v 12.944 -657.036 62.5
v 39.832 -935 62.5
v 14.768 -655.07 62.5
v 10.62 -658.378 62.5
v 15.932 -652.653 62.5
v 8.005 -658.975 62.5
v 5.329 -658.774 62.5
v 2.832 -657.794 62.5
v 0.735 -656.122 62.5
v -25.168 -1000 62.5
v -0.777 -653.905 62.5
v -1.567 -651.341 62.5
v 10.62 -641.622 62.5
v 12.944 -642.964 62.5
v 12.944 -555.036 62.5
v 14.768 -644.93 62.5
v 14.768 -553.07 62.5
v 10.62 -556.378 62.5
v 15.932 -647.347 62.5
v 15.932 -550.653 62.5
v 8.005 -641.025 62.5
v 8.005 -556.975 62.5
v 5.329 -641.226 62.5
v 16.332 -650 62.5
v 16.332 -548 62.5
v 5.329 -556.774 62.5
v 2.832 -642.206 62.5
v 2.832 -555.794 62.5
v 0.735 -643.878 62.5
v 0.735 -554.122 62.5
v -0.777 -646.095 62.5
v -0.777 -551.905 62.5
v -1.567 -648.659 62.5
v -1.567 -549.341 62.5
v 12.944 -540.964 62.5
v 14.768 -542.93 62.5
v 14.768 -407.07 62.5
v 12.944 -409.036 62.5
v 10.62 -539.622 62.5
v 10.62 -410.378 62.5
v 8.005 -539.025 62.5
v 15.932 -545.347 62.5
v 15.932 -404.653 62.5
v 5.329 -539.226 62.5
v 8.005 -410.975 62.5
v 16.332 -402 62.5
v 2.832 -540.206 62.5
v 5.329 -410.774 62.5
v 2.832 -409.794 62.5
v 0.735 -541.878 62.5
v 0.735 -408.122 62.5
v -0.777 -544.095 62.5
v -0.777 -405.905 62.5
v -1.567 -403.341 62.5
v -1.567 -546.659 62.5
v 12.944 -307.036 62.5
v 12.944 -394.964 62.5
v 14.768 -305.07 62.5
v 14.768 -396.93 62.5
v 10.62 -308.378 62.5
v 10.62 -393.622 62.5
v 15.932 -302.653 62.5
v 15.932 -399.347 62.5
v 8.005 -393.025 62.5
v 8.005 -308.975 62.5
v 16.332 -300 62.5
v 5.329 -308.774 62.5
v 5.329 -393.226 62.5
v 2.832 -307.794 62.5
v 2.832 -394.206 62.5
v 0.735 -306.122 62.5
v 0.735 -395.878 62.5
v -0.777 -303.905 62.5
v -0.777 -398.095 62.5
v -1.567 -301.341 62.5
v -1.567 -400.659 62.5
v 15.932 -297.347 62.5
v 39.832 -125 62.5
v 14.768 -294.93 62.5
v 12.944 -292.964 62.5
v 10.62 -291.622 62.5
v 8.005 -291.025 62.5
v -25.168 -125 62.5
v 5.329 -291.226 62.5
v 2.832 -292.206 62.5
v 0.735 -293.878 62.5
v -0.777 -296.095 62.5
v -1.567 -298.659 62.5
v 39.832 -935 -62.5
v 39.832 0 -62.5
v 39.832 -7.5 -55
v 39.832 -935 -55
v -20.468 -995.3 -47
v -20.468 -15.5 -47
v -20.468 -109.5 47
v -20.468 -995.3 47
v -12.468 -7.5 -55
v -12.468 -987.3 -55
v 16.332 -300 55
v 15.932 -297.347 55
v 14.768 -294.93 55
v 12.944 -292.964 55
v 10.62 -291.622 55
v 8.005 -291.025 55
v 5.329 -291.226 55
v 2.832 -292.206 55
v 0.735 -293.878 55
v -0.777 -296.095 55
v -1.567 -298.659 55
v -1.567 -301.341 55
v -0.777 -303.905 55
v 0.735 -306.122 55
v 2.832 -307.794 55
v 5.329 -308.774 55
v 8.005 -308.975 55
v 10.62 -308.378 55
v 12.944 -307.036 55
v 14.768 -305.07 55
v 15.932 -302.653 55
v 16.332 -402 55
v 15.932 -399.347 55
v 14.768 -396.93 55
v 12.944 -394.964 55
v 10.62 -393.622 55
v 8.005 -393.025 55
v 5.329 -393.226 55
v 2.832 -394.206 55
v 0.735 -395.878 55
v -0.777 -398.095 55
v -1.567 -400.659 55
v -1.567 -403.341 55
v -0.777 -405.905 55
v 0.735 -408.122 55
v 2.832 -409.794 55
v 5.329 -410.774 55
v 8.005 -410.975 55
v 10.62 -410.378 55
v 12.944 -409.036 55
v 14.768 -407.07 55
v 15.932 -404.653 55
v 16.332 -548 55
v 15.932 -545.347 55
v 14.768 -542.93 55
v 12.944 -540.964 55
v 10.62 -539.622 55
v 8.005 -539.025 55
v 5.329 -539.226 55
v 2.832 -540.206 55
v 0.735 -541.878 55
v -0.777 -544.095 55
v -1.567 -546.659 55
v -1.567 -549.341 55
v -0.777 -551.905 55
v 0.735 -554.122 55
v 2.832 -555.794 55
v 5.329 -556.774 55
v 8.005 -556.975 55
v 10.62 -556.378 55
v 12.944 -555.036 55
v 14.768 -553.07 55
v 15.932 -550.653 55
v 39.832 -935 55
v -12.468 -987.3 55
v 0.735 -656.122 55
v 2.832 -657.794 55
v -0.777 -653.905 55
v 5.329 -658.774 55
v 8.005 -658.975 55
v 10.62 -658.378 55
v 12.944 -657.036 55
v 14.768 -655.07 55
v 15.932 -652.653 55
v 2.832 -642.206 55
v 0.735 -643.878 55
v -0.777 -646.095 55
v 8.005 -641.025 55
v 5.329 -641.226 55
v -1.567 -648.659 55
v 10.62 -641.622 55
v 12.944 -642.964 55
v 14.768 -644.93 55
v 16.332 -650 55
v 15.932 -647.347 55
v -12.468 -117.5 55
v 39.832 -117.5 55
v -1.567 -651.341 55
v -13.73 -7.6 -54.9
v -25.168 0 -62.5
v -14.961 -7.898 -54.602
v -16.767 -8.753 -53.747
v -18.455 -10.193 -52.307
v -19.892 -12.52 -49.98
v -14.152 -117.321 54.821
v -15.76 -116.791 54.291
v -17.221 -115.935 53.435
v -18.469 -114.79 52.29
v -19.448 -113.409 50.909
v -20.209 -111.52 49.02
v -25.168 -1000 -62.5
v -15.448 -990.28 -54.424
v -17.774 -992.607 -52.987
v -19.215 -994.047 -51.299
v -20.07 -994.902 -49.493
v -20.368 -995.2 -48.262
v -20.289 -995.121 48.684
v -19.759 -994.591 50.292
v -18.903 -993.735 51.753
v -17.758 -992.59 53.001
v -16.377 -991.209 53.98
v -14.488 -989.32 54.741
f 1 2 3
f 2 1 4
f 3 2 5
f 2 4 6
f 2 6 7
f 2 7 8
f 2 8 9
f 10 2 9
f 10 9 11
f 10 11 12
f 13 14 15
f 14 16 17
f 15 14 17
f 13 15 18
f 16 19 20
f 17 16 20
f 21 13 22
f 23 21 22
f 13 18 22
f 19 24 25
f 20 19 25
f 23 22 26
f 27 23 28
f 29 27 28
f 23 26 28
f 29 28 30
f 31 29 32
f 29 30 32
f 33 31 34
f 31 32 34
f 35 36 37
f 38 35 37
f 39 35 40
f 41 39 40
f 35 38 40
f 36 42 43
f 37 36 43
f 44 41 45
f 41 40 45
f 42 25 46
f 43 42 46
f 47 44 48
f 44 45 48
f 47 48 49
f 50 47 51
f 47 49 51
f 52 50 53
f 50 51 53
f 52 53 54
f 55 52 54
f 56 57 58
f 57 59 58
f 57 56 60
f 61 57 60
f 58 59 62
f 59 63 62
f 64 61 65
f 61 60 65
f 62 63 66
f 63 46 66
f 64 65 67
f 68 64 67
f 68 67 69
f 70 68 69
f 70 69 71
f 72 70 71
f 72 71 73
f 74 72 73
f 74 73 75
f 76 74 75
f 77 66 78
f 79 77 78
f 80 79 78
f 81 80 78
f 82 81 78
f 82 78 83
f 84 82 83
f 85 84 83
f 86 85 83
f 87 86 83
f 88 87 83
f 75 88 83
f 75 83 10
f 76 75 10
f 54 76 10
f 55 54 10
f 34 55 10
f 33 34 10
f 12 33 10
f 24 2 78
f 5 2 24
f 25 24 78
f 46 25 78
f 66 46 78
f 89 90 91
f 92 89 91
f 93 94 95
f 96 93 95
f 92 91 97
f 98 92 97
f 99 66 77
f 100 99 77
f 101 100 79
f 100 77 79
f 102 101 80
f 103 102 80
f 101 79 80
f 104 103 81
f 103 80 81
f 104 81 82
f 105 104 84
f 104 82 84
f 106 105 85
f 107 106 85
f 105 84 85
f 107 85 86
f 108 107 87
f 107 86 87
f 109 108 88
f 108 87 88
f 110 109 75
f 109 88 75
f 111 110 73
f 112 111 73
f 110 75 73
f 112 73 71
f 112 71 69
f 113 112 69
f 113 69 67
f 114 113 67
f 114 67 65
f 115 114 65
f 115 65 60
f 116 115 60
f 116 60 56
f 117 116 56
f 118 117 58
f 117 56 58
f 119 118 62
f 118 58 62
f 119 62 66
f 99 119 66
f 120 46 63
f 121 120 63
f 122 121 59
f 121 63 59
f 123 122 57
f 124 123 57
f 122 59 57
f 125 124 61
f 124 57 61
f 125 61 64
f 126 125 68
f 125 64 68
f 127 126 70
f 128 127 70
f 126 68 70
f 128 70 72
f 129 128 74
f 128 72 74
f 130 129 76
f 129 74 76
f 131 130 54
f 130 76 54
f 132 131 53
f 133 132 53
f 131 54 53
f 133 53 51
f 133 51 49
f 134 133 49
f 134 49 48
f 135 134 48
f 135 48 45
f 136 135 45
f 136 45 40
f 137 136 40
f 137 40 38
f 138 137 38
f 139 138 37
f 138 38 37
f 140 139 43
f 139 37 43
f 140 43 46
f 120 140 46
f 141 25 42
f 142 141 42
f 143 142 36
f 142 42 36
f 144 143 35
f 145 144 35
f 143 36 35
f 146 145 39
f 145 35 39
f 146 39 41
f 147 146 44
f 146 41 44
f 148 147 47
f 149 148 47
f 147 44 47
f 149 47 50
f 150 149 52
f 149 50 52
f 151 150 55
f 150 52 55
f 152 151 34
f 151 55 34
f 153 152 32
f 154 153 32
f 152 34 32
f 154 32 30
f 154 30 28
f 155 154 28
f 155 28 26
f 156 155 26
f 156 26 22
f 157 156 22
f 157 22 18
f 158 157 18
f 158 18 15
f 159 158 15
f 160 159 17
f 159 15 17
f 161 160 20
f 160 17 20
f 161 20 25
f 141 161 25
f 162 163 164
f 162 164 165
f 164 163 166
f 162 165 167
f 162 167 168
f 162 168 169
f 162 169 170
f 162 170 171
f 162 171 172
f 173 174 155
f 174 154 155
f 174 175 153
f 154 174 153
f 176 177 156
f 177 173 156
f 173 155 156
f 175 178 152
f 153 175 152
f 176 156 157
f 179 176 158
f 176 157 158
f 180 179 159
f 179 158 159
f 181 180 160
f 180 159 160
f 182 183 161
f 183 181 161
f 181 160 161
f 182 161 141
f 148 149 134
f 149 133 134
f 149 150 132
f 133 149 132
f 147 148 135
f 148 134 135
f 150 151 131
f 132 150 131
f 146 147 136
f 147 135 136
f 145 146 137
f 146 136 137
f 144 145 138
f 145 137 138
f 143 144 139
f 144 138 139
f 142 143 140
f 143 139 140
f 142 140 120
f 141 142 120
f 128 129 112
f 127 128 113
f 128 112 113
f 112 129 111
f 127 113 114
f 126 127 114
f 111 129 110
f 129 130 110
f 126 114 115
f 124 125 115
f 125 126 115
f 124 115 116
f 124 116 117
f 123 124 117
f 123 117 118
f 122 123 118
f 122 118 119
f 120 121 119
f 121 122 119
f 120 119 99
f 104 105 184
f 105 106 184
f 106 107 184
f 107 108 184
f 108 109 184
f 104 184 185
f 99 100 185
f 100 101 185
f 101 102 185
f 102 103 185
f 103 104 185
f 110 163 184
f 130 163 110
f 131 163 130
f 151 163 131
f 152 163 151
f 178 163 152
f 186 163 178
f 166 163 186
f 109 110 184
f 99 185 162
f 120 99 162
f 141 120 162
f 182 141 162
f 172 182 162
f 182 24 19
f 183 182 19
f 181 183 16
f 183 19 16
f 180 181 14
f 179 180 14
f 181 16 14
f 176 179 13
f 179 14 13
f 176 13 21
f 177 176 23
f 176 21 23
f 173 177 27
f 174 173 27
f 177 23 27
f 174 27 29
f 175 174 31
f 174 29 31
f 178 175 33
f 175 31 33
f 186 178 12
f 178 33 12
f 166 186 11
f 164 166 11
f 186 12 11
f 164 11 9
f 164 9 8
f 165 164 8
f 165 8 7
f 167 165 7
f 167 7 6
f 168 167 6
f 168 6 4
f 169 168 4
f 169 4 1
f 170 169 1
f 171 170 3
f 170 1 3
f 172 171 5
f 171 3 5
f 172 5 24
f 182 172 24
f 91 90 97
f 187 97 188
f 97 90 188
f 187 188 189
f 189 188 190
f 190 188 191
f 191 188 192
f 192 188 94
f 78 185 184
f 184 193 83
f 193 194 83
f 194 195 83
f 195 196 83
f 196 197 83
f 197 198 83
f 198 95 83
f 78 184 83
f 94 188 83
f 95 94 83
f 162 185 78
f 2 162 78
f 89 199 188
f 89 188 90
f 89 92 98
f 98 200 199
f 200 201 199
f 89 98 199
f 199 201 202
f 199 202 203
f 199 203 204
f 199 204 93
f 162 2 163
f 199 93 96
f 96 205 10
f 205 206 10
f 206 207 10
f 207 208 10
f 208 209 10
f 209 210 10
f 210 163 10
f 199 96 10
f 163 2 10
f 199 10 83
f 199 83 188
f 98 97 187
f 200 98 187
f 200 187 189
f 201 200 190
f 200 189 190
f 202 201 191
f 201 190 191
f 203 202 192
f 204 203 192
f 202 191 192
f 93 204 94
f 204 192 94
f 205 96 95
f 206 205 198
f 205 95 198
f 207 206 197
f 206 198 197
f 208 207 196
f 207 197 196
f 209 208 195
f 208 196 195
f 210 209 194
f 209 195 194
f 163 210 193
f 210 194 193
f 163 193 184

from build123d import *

# Parameters (mm, degrees)
F1_DEPTH = 1000
F3_DEPTH = 65.001
F5_DEPTH = 125.001
F6_R     = 9
F7_DEPTH = 7.5
F8_R     = 9
F9_DEPTH = 7.5


with BuildPart() as f1:
    # F0 (on Front) → F1 (new body)
    with BuildSketch(Plane.XZ):
        with BuildLine():
            Line((-25.16784, 62.5), (-25.16784, -62.5))
            Line((-25.16784, -62.5), (39.83216, -62.5))
            Line((39.83216, -62.5), (39.83216, -55))
            Line((39.83216, -55), (-12.46784, -55))
            ThreePointArc((-12.46784, -55), (-18.124695, -52.656854), (-20.46784, -47))
            Line((-20.46784, -47), (-20.46784, 47))
            ThreePointArc((-20.46784, 47), (-18.124695, 52.656854), (-12.46784, 55))
            Line((-12.46784, 55), (39.83216, 55))
            Line((39.83216, 55), (39.83216, 62.5))
            Line((39.83216, 62.5), (-25.16784, 62.5))
        make_face()
    extrude(amount=F1_DEPTH)

    # F2 (on face) → F3 (cut, through all)
    with BuildSketch(Plane(origin=(-25.16784, 0, 0), x_dir=(0, -1, 0), z_dir=(-1, 0, 0))):
        Polygon((125, 62.5), (0, 62.5), (0, -62.5), align=None)
    extrude(amount=-F3_DEPTH, mode=Mode.SUBTRACT)

    # F4 (on face) → F5 (cut, through all)
    with BuildSketch(Plane.XY.offset(62.5)):
        Polygon((-25.16784, -1000), (39.83216, -1000), (39.83216, -935), align=None)
    extrude(amount=-F5_DEPTH, mode=Mode.SUBTRACT)

    # F6 (on face) → F7 (cut, through all)
    with BuildSketch(Plane.XY.offset(62.5)):
        with Locations((7.33216, -548)):
            Circle(F6_R)
        with Locations((7.33216, -650)):
            Circle(F6_R)
    extrude(amount=-F7_DEPTH, mode=Mode.SUBTRACT)

    # F8 (on face) → F9 (cut, through all)
    with BuildSketch(Plane.XY.offset(62.5)):
        with Locations((7.33216, -300)):
            Circle(F8_R)
        with Locations((7.33216, -402)):
            Circle(F8_R)
    extrude(amount=-F9_DEPTH, mode=Mode.SUBTRACT)


solid = f1.part
